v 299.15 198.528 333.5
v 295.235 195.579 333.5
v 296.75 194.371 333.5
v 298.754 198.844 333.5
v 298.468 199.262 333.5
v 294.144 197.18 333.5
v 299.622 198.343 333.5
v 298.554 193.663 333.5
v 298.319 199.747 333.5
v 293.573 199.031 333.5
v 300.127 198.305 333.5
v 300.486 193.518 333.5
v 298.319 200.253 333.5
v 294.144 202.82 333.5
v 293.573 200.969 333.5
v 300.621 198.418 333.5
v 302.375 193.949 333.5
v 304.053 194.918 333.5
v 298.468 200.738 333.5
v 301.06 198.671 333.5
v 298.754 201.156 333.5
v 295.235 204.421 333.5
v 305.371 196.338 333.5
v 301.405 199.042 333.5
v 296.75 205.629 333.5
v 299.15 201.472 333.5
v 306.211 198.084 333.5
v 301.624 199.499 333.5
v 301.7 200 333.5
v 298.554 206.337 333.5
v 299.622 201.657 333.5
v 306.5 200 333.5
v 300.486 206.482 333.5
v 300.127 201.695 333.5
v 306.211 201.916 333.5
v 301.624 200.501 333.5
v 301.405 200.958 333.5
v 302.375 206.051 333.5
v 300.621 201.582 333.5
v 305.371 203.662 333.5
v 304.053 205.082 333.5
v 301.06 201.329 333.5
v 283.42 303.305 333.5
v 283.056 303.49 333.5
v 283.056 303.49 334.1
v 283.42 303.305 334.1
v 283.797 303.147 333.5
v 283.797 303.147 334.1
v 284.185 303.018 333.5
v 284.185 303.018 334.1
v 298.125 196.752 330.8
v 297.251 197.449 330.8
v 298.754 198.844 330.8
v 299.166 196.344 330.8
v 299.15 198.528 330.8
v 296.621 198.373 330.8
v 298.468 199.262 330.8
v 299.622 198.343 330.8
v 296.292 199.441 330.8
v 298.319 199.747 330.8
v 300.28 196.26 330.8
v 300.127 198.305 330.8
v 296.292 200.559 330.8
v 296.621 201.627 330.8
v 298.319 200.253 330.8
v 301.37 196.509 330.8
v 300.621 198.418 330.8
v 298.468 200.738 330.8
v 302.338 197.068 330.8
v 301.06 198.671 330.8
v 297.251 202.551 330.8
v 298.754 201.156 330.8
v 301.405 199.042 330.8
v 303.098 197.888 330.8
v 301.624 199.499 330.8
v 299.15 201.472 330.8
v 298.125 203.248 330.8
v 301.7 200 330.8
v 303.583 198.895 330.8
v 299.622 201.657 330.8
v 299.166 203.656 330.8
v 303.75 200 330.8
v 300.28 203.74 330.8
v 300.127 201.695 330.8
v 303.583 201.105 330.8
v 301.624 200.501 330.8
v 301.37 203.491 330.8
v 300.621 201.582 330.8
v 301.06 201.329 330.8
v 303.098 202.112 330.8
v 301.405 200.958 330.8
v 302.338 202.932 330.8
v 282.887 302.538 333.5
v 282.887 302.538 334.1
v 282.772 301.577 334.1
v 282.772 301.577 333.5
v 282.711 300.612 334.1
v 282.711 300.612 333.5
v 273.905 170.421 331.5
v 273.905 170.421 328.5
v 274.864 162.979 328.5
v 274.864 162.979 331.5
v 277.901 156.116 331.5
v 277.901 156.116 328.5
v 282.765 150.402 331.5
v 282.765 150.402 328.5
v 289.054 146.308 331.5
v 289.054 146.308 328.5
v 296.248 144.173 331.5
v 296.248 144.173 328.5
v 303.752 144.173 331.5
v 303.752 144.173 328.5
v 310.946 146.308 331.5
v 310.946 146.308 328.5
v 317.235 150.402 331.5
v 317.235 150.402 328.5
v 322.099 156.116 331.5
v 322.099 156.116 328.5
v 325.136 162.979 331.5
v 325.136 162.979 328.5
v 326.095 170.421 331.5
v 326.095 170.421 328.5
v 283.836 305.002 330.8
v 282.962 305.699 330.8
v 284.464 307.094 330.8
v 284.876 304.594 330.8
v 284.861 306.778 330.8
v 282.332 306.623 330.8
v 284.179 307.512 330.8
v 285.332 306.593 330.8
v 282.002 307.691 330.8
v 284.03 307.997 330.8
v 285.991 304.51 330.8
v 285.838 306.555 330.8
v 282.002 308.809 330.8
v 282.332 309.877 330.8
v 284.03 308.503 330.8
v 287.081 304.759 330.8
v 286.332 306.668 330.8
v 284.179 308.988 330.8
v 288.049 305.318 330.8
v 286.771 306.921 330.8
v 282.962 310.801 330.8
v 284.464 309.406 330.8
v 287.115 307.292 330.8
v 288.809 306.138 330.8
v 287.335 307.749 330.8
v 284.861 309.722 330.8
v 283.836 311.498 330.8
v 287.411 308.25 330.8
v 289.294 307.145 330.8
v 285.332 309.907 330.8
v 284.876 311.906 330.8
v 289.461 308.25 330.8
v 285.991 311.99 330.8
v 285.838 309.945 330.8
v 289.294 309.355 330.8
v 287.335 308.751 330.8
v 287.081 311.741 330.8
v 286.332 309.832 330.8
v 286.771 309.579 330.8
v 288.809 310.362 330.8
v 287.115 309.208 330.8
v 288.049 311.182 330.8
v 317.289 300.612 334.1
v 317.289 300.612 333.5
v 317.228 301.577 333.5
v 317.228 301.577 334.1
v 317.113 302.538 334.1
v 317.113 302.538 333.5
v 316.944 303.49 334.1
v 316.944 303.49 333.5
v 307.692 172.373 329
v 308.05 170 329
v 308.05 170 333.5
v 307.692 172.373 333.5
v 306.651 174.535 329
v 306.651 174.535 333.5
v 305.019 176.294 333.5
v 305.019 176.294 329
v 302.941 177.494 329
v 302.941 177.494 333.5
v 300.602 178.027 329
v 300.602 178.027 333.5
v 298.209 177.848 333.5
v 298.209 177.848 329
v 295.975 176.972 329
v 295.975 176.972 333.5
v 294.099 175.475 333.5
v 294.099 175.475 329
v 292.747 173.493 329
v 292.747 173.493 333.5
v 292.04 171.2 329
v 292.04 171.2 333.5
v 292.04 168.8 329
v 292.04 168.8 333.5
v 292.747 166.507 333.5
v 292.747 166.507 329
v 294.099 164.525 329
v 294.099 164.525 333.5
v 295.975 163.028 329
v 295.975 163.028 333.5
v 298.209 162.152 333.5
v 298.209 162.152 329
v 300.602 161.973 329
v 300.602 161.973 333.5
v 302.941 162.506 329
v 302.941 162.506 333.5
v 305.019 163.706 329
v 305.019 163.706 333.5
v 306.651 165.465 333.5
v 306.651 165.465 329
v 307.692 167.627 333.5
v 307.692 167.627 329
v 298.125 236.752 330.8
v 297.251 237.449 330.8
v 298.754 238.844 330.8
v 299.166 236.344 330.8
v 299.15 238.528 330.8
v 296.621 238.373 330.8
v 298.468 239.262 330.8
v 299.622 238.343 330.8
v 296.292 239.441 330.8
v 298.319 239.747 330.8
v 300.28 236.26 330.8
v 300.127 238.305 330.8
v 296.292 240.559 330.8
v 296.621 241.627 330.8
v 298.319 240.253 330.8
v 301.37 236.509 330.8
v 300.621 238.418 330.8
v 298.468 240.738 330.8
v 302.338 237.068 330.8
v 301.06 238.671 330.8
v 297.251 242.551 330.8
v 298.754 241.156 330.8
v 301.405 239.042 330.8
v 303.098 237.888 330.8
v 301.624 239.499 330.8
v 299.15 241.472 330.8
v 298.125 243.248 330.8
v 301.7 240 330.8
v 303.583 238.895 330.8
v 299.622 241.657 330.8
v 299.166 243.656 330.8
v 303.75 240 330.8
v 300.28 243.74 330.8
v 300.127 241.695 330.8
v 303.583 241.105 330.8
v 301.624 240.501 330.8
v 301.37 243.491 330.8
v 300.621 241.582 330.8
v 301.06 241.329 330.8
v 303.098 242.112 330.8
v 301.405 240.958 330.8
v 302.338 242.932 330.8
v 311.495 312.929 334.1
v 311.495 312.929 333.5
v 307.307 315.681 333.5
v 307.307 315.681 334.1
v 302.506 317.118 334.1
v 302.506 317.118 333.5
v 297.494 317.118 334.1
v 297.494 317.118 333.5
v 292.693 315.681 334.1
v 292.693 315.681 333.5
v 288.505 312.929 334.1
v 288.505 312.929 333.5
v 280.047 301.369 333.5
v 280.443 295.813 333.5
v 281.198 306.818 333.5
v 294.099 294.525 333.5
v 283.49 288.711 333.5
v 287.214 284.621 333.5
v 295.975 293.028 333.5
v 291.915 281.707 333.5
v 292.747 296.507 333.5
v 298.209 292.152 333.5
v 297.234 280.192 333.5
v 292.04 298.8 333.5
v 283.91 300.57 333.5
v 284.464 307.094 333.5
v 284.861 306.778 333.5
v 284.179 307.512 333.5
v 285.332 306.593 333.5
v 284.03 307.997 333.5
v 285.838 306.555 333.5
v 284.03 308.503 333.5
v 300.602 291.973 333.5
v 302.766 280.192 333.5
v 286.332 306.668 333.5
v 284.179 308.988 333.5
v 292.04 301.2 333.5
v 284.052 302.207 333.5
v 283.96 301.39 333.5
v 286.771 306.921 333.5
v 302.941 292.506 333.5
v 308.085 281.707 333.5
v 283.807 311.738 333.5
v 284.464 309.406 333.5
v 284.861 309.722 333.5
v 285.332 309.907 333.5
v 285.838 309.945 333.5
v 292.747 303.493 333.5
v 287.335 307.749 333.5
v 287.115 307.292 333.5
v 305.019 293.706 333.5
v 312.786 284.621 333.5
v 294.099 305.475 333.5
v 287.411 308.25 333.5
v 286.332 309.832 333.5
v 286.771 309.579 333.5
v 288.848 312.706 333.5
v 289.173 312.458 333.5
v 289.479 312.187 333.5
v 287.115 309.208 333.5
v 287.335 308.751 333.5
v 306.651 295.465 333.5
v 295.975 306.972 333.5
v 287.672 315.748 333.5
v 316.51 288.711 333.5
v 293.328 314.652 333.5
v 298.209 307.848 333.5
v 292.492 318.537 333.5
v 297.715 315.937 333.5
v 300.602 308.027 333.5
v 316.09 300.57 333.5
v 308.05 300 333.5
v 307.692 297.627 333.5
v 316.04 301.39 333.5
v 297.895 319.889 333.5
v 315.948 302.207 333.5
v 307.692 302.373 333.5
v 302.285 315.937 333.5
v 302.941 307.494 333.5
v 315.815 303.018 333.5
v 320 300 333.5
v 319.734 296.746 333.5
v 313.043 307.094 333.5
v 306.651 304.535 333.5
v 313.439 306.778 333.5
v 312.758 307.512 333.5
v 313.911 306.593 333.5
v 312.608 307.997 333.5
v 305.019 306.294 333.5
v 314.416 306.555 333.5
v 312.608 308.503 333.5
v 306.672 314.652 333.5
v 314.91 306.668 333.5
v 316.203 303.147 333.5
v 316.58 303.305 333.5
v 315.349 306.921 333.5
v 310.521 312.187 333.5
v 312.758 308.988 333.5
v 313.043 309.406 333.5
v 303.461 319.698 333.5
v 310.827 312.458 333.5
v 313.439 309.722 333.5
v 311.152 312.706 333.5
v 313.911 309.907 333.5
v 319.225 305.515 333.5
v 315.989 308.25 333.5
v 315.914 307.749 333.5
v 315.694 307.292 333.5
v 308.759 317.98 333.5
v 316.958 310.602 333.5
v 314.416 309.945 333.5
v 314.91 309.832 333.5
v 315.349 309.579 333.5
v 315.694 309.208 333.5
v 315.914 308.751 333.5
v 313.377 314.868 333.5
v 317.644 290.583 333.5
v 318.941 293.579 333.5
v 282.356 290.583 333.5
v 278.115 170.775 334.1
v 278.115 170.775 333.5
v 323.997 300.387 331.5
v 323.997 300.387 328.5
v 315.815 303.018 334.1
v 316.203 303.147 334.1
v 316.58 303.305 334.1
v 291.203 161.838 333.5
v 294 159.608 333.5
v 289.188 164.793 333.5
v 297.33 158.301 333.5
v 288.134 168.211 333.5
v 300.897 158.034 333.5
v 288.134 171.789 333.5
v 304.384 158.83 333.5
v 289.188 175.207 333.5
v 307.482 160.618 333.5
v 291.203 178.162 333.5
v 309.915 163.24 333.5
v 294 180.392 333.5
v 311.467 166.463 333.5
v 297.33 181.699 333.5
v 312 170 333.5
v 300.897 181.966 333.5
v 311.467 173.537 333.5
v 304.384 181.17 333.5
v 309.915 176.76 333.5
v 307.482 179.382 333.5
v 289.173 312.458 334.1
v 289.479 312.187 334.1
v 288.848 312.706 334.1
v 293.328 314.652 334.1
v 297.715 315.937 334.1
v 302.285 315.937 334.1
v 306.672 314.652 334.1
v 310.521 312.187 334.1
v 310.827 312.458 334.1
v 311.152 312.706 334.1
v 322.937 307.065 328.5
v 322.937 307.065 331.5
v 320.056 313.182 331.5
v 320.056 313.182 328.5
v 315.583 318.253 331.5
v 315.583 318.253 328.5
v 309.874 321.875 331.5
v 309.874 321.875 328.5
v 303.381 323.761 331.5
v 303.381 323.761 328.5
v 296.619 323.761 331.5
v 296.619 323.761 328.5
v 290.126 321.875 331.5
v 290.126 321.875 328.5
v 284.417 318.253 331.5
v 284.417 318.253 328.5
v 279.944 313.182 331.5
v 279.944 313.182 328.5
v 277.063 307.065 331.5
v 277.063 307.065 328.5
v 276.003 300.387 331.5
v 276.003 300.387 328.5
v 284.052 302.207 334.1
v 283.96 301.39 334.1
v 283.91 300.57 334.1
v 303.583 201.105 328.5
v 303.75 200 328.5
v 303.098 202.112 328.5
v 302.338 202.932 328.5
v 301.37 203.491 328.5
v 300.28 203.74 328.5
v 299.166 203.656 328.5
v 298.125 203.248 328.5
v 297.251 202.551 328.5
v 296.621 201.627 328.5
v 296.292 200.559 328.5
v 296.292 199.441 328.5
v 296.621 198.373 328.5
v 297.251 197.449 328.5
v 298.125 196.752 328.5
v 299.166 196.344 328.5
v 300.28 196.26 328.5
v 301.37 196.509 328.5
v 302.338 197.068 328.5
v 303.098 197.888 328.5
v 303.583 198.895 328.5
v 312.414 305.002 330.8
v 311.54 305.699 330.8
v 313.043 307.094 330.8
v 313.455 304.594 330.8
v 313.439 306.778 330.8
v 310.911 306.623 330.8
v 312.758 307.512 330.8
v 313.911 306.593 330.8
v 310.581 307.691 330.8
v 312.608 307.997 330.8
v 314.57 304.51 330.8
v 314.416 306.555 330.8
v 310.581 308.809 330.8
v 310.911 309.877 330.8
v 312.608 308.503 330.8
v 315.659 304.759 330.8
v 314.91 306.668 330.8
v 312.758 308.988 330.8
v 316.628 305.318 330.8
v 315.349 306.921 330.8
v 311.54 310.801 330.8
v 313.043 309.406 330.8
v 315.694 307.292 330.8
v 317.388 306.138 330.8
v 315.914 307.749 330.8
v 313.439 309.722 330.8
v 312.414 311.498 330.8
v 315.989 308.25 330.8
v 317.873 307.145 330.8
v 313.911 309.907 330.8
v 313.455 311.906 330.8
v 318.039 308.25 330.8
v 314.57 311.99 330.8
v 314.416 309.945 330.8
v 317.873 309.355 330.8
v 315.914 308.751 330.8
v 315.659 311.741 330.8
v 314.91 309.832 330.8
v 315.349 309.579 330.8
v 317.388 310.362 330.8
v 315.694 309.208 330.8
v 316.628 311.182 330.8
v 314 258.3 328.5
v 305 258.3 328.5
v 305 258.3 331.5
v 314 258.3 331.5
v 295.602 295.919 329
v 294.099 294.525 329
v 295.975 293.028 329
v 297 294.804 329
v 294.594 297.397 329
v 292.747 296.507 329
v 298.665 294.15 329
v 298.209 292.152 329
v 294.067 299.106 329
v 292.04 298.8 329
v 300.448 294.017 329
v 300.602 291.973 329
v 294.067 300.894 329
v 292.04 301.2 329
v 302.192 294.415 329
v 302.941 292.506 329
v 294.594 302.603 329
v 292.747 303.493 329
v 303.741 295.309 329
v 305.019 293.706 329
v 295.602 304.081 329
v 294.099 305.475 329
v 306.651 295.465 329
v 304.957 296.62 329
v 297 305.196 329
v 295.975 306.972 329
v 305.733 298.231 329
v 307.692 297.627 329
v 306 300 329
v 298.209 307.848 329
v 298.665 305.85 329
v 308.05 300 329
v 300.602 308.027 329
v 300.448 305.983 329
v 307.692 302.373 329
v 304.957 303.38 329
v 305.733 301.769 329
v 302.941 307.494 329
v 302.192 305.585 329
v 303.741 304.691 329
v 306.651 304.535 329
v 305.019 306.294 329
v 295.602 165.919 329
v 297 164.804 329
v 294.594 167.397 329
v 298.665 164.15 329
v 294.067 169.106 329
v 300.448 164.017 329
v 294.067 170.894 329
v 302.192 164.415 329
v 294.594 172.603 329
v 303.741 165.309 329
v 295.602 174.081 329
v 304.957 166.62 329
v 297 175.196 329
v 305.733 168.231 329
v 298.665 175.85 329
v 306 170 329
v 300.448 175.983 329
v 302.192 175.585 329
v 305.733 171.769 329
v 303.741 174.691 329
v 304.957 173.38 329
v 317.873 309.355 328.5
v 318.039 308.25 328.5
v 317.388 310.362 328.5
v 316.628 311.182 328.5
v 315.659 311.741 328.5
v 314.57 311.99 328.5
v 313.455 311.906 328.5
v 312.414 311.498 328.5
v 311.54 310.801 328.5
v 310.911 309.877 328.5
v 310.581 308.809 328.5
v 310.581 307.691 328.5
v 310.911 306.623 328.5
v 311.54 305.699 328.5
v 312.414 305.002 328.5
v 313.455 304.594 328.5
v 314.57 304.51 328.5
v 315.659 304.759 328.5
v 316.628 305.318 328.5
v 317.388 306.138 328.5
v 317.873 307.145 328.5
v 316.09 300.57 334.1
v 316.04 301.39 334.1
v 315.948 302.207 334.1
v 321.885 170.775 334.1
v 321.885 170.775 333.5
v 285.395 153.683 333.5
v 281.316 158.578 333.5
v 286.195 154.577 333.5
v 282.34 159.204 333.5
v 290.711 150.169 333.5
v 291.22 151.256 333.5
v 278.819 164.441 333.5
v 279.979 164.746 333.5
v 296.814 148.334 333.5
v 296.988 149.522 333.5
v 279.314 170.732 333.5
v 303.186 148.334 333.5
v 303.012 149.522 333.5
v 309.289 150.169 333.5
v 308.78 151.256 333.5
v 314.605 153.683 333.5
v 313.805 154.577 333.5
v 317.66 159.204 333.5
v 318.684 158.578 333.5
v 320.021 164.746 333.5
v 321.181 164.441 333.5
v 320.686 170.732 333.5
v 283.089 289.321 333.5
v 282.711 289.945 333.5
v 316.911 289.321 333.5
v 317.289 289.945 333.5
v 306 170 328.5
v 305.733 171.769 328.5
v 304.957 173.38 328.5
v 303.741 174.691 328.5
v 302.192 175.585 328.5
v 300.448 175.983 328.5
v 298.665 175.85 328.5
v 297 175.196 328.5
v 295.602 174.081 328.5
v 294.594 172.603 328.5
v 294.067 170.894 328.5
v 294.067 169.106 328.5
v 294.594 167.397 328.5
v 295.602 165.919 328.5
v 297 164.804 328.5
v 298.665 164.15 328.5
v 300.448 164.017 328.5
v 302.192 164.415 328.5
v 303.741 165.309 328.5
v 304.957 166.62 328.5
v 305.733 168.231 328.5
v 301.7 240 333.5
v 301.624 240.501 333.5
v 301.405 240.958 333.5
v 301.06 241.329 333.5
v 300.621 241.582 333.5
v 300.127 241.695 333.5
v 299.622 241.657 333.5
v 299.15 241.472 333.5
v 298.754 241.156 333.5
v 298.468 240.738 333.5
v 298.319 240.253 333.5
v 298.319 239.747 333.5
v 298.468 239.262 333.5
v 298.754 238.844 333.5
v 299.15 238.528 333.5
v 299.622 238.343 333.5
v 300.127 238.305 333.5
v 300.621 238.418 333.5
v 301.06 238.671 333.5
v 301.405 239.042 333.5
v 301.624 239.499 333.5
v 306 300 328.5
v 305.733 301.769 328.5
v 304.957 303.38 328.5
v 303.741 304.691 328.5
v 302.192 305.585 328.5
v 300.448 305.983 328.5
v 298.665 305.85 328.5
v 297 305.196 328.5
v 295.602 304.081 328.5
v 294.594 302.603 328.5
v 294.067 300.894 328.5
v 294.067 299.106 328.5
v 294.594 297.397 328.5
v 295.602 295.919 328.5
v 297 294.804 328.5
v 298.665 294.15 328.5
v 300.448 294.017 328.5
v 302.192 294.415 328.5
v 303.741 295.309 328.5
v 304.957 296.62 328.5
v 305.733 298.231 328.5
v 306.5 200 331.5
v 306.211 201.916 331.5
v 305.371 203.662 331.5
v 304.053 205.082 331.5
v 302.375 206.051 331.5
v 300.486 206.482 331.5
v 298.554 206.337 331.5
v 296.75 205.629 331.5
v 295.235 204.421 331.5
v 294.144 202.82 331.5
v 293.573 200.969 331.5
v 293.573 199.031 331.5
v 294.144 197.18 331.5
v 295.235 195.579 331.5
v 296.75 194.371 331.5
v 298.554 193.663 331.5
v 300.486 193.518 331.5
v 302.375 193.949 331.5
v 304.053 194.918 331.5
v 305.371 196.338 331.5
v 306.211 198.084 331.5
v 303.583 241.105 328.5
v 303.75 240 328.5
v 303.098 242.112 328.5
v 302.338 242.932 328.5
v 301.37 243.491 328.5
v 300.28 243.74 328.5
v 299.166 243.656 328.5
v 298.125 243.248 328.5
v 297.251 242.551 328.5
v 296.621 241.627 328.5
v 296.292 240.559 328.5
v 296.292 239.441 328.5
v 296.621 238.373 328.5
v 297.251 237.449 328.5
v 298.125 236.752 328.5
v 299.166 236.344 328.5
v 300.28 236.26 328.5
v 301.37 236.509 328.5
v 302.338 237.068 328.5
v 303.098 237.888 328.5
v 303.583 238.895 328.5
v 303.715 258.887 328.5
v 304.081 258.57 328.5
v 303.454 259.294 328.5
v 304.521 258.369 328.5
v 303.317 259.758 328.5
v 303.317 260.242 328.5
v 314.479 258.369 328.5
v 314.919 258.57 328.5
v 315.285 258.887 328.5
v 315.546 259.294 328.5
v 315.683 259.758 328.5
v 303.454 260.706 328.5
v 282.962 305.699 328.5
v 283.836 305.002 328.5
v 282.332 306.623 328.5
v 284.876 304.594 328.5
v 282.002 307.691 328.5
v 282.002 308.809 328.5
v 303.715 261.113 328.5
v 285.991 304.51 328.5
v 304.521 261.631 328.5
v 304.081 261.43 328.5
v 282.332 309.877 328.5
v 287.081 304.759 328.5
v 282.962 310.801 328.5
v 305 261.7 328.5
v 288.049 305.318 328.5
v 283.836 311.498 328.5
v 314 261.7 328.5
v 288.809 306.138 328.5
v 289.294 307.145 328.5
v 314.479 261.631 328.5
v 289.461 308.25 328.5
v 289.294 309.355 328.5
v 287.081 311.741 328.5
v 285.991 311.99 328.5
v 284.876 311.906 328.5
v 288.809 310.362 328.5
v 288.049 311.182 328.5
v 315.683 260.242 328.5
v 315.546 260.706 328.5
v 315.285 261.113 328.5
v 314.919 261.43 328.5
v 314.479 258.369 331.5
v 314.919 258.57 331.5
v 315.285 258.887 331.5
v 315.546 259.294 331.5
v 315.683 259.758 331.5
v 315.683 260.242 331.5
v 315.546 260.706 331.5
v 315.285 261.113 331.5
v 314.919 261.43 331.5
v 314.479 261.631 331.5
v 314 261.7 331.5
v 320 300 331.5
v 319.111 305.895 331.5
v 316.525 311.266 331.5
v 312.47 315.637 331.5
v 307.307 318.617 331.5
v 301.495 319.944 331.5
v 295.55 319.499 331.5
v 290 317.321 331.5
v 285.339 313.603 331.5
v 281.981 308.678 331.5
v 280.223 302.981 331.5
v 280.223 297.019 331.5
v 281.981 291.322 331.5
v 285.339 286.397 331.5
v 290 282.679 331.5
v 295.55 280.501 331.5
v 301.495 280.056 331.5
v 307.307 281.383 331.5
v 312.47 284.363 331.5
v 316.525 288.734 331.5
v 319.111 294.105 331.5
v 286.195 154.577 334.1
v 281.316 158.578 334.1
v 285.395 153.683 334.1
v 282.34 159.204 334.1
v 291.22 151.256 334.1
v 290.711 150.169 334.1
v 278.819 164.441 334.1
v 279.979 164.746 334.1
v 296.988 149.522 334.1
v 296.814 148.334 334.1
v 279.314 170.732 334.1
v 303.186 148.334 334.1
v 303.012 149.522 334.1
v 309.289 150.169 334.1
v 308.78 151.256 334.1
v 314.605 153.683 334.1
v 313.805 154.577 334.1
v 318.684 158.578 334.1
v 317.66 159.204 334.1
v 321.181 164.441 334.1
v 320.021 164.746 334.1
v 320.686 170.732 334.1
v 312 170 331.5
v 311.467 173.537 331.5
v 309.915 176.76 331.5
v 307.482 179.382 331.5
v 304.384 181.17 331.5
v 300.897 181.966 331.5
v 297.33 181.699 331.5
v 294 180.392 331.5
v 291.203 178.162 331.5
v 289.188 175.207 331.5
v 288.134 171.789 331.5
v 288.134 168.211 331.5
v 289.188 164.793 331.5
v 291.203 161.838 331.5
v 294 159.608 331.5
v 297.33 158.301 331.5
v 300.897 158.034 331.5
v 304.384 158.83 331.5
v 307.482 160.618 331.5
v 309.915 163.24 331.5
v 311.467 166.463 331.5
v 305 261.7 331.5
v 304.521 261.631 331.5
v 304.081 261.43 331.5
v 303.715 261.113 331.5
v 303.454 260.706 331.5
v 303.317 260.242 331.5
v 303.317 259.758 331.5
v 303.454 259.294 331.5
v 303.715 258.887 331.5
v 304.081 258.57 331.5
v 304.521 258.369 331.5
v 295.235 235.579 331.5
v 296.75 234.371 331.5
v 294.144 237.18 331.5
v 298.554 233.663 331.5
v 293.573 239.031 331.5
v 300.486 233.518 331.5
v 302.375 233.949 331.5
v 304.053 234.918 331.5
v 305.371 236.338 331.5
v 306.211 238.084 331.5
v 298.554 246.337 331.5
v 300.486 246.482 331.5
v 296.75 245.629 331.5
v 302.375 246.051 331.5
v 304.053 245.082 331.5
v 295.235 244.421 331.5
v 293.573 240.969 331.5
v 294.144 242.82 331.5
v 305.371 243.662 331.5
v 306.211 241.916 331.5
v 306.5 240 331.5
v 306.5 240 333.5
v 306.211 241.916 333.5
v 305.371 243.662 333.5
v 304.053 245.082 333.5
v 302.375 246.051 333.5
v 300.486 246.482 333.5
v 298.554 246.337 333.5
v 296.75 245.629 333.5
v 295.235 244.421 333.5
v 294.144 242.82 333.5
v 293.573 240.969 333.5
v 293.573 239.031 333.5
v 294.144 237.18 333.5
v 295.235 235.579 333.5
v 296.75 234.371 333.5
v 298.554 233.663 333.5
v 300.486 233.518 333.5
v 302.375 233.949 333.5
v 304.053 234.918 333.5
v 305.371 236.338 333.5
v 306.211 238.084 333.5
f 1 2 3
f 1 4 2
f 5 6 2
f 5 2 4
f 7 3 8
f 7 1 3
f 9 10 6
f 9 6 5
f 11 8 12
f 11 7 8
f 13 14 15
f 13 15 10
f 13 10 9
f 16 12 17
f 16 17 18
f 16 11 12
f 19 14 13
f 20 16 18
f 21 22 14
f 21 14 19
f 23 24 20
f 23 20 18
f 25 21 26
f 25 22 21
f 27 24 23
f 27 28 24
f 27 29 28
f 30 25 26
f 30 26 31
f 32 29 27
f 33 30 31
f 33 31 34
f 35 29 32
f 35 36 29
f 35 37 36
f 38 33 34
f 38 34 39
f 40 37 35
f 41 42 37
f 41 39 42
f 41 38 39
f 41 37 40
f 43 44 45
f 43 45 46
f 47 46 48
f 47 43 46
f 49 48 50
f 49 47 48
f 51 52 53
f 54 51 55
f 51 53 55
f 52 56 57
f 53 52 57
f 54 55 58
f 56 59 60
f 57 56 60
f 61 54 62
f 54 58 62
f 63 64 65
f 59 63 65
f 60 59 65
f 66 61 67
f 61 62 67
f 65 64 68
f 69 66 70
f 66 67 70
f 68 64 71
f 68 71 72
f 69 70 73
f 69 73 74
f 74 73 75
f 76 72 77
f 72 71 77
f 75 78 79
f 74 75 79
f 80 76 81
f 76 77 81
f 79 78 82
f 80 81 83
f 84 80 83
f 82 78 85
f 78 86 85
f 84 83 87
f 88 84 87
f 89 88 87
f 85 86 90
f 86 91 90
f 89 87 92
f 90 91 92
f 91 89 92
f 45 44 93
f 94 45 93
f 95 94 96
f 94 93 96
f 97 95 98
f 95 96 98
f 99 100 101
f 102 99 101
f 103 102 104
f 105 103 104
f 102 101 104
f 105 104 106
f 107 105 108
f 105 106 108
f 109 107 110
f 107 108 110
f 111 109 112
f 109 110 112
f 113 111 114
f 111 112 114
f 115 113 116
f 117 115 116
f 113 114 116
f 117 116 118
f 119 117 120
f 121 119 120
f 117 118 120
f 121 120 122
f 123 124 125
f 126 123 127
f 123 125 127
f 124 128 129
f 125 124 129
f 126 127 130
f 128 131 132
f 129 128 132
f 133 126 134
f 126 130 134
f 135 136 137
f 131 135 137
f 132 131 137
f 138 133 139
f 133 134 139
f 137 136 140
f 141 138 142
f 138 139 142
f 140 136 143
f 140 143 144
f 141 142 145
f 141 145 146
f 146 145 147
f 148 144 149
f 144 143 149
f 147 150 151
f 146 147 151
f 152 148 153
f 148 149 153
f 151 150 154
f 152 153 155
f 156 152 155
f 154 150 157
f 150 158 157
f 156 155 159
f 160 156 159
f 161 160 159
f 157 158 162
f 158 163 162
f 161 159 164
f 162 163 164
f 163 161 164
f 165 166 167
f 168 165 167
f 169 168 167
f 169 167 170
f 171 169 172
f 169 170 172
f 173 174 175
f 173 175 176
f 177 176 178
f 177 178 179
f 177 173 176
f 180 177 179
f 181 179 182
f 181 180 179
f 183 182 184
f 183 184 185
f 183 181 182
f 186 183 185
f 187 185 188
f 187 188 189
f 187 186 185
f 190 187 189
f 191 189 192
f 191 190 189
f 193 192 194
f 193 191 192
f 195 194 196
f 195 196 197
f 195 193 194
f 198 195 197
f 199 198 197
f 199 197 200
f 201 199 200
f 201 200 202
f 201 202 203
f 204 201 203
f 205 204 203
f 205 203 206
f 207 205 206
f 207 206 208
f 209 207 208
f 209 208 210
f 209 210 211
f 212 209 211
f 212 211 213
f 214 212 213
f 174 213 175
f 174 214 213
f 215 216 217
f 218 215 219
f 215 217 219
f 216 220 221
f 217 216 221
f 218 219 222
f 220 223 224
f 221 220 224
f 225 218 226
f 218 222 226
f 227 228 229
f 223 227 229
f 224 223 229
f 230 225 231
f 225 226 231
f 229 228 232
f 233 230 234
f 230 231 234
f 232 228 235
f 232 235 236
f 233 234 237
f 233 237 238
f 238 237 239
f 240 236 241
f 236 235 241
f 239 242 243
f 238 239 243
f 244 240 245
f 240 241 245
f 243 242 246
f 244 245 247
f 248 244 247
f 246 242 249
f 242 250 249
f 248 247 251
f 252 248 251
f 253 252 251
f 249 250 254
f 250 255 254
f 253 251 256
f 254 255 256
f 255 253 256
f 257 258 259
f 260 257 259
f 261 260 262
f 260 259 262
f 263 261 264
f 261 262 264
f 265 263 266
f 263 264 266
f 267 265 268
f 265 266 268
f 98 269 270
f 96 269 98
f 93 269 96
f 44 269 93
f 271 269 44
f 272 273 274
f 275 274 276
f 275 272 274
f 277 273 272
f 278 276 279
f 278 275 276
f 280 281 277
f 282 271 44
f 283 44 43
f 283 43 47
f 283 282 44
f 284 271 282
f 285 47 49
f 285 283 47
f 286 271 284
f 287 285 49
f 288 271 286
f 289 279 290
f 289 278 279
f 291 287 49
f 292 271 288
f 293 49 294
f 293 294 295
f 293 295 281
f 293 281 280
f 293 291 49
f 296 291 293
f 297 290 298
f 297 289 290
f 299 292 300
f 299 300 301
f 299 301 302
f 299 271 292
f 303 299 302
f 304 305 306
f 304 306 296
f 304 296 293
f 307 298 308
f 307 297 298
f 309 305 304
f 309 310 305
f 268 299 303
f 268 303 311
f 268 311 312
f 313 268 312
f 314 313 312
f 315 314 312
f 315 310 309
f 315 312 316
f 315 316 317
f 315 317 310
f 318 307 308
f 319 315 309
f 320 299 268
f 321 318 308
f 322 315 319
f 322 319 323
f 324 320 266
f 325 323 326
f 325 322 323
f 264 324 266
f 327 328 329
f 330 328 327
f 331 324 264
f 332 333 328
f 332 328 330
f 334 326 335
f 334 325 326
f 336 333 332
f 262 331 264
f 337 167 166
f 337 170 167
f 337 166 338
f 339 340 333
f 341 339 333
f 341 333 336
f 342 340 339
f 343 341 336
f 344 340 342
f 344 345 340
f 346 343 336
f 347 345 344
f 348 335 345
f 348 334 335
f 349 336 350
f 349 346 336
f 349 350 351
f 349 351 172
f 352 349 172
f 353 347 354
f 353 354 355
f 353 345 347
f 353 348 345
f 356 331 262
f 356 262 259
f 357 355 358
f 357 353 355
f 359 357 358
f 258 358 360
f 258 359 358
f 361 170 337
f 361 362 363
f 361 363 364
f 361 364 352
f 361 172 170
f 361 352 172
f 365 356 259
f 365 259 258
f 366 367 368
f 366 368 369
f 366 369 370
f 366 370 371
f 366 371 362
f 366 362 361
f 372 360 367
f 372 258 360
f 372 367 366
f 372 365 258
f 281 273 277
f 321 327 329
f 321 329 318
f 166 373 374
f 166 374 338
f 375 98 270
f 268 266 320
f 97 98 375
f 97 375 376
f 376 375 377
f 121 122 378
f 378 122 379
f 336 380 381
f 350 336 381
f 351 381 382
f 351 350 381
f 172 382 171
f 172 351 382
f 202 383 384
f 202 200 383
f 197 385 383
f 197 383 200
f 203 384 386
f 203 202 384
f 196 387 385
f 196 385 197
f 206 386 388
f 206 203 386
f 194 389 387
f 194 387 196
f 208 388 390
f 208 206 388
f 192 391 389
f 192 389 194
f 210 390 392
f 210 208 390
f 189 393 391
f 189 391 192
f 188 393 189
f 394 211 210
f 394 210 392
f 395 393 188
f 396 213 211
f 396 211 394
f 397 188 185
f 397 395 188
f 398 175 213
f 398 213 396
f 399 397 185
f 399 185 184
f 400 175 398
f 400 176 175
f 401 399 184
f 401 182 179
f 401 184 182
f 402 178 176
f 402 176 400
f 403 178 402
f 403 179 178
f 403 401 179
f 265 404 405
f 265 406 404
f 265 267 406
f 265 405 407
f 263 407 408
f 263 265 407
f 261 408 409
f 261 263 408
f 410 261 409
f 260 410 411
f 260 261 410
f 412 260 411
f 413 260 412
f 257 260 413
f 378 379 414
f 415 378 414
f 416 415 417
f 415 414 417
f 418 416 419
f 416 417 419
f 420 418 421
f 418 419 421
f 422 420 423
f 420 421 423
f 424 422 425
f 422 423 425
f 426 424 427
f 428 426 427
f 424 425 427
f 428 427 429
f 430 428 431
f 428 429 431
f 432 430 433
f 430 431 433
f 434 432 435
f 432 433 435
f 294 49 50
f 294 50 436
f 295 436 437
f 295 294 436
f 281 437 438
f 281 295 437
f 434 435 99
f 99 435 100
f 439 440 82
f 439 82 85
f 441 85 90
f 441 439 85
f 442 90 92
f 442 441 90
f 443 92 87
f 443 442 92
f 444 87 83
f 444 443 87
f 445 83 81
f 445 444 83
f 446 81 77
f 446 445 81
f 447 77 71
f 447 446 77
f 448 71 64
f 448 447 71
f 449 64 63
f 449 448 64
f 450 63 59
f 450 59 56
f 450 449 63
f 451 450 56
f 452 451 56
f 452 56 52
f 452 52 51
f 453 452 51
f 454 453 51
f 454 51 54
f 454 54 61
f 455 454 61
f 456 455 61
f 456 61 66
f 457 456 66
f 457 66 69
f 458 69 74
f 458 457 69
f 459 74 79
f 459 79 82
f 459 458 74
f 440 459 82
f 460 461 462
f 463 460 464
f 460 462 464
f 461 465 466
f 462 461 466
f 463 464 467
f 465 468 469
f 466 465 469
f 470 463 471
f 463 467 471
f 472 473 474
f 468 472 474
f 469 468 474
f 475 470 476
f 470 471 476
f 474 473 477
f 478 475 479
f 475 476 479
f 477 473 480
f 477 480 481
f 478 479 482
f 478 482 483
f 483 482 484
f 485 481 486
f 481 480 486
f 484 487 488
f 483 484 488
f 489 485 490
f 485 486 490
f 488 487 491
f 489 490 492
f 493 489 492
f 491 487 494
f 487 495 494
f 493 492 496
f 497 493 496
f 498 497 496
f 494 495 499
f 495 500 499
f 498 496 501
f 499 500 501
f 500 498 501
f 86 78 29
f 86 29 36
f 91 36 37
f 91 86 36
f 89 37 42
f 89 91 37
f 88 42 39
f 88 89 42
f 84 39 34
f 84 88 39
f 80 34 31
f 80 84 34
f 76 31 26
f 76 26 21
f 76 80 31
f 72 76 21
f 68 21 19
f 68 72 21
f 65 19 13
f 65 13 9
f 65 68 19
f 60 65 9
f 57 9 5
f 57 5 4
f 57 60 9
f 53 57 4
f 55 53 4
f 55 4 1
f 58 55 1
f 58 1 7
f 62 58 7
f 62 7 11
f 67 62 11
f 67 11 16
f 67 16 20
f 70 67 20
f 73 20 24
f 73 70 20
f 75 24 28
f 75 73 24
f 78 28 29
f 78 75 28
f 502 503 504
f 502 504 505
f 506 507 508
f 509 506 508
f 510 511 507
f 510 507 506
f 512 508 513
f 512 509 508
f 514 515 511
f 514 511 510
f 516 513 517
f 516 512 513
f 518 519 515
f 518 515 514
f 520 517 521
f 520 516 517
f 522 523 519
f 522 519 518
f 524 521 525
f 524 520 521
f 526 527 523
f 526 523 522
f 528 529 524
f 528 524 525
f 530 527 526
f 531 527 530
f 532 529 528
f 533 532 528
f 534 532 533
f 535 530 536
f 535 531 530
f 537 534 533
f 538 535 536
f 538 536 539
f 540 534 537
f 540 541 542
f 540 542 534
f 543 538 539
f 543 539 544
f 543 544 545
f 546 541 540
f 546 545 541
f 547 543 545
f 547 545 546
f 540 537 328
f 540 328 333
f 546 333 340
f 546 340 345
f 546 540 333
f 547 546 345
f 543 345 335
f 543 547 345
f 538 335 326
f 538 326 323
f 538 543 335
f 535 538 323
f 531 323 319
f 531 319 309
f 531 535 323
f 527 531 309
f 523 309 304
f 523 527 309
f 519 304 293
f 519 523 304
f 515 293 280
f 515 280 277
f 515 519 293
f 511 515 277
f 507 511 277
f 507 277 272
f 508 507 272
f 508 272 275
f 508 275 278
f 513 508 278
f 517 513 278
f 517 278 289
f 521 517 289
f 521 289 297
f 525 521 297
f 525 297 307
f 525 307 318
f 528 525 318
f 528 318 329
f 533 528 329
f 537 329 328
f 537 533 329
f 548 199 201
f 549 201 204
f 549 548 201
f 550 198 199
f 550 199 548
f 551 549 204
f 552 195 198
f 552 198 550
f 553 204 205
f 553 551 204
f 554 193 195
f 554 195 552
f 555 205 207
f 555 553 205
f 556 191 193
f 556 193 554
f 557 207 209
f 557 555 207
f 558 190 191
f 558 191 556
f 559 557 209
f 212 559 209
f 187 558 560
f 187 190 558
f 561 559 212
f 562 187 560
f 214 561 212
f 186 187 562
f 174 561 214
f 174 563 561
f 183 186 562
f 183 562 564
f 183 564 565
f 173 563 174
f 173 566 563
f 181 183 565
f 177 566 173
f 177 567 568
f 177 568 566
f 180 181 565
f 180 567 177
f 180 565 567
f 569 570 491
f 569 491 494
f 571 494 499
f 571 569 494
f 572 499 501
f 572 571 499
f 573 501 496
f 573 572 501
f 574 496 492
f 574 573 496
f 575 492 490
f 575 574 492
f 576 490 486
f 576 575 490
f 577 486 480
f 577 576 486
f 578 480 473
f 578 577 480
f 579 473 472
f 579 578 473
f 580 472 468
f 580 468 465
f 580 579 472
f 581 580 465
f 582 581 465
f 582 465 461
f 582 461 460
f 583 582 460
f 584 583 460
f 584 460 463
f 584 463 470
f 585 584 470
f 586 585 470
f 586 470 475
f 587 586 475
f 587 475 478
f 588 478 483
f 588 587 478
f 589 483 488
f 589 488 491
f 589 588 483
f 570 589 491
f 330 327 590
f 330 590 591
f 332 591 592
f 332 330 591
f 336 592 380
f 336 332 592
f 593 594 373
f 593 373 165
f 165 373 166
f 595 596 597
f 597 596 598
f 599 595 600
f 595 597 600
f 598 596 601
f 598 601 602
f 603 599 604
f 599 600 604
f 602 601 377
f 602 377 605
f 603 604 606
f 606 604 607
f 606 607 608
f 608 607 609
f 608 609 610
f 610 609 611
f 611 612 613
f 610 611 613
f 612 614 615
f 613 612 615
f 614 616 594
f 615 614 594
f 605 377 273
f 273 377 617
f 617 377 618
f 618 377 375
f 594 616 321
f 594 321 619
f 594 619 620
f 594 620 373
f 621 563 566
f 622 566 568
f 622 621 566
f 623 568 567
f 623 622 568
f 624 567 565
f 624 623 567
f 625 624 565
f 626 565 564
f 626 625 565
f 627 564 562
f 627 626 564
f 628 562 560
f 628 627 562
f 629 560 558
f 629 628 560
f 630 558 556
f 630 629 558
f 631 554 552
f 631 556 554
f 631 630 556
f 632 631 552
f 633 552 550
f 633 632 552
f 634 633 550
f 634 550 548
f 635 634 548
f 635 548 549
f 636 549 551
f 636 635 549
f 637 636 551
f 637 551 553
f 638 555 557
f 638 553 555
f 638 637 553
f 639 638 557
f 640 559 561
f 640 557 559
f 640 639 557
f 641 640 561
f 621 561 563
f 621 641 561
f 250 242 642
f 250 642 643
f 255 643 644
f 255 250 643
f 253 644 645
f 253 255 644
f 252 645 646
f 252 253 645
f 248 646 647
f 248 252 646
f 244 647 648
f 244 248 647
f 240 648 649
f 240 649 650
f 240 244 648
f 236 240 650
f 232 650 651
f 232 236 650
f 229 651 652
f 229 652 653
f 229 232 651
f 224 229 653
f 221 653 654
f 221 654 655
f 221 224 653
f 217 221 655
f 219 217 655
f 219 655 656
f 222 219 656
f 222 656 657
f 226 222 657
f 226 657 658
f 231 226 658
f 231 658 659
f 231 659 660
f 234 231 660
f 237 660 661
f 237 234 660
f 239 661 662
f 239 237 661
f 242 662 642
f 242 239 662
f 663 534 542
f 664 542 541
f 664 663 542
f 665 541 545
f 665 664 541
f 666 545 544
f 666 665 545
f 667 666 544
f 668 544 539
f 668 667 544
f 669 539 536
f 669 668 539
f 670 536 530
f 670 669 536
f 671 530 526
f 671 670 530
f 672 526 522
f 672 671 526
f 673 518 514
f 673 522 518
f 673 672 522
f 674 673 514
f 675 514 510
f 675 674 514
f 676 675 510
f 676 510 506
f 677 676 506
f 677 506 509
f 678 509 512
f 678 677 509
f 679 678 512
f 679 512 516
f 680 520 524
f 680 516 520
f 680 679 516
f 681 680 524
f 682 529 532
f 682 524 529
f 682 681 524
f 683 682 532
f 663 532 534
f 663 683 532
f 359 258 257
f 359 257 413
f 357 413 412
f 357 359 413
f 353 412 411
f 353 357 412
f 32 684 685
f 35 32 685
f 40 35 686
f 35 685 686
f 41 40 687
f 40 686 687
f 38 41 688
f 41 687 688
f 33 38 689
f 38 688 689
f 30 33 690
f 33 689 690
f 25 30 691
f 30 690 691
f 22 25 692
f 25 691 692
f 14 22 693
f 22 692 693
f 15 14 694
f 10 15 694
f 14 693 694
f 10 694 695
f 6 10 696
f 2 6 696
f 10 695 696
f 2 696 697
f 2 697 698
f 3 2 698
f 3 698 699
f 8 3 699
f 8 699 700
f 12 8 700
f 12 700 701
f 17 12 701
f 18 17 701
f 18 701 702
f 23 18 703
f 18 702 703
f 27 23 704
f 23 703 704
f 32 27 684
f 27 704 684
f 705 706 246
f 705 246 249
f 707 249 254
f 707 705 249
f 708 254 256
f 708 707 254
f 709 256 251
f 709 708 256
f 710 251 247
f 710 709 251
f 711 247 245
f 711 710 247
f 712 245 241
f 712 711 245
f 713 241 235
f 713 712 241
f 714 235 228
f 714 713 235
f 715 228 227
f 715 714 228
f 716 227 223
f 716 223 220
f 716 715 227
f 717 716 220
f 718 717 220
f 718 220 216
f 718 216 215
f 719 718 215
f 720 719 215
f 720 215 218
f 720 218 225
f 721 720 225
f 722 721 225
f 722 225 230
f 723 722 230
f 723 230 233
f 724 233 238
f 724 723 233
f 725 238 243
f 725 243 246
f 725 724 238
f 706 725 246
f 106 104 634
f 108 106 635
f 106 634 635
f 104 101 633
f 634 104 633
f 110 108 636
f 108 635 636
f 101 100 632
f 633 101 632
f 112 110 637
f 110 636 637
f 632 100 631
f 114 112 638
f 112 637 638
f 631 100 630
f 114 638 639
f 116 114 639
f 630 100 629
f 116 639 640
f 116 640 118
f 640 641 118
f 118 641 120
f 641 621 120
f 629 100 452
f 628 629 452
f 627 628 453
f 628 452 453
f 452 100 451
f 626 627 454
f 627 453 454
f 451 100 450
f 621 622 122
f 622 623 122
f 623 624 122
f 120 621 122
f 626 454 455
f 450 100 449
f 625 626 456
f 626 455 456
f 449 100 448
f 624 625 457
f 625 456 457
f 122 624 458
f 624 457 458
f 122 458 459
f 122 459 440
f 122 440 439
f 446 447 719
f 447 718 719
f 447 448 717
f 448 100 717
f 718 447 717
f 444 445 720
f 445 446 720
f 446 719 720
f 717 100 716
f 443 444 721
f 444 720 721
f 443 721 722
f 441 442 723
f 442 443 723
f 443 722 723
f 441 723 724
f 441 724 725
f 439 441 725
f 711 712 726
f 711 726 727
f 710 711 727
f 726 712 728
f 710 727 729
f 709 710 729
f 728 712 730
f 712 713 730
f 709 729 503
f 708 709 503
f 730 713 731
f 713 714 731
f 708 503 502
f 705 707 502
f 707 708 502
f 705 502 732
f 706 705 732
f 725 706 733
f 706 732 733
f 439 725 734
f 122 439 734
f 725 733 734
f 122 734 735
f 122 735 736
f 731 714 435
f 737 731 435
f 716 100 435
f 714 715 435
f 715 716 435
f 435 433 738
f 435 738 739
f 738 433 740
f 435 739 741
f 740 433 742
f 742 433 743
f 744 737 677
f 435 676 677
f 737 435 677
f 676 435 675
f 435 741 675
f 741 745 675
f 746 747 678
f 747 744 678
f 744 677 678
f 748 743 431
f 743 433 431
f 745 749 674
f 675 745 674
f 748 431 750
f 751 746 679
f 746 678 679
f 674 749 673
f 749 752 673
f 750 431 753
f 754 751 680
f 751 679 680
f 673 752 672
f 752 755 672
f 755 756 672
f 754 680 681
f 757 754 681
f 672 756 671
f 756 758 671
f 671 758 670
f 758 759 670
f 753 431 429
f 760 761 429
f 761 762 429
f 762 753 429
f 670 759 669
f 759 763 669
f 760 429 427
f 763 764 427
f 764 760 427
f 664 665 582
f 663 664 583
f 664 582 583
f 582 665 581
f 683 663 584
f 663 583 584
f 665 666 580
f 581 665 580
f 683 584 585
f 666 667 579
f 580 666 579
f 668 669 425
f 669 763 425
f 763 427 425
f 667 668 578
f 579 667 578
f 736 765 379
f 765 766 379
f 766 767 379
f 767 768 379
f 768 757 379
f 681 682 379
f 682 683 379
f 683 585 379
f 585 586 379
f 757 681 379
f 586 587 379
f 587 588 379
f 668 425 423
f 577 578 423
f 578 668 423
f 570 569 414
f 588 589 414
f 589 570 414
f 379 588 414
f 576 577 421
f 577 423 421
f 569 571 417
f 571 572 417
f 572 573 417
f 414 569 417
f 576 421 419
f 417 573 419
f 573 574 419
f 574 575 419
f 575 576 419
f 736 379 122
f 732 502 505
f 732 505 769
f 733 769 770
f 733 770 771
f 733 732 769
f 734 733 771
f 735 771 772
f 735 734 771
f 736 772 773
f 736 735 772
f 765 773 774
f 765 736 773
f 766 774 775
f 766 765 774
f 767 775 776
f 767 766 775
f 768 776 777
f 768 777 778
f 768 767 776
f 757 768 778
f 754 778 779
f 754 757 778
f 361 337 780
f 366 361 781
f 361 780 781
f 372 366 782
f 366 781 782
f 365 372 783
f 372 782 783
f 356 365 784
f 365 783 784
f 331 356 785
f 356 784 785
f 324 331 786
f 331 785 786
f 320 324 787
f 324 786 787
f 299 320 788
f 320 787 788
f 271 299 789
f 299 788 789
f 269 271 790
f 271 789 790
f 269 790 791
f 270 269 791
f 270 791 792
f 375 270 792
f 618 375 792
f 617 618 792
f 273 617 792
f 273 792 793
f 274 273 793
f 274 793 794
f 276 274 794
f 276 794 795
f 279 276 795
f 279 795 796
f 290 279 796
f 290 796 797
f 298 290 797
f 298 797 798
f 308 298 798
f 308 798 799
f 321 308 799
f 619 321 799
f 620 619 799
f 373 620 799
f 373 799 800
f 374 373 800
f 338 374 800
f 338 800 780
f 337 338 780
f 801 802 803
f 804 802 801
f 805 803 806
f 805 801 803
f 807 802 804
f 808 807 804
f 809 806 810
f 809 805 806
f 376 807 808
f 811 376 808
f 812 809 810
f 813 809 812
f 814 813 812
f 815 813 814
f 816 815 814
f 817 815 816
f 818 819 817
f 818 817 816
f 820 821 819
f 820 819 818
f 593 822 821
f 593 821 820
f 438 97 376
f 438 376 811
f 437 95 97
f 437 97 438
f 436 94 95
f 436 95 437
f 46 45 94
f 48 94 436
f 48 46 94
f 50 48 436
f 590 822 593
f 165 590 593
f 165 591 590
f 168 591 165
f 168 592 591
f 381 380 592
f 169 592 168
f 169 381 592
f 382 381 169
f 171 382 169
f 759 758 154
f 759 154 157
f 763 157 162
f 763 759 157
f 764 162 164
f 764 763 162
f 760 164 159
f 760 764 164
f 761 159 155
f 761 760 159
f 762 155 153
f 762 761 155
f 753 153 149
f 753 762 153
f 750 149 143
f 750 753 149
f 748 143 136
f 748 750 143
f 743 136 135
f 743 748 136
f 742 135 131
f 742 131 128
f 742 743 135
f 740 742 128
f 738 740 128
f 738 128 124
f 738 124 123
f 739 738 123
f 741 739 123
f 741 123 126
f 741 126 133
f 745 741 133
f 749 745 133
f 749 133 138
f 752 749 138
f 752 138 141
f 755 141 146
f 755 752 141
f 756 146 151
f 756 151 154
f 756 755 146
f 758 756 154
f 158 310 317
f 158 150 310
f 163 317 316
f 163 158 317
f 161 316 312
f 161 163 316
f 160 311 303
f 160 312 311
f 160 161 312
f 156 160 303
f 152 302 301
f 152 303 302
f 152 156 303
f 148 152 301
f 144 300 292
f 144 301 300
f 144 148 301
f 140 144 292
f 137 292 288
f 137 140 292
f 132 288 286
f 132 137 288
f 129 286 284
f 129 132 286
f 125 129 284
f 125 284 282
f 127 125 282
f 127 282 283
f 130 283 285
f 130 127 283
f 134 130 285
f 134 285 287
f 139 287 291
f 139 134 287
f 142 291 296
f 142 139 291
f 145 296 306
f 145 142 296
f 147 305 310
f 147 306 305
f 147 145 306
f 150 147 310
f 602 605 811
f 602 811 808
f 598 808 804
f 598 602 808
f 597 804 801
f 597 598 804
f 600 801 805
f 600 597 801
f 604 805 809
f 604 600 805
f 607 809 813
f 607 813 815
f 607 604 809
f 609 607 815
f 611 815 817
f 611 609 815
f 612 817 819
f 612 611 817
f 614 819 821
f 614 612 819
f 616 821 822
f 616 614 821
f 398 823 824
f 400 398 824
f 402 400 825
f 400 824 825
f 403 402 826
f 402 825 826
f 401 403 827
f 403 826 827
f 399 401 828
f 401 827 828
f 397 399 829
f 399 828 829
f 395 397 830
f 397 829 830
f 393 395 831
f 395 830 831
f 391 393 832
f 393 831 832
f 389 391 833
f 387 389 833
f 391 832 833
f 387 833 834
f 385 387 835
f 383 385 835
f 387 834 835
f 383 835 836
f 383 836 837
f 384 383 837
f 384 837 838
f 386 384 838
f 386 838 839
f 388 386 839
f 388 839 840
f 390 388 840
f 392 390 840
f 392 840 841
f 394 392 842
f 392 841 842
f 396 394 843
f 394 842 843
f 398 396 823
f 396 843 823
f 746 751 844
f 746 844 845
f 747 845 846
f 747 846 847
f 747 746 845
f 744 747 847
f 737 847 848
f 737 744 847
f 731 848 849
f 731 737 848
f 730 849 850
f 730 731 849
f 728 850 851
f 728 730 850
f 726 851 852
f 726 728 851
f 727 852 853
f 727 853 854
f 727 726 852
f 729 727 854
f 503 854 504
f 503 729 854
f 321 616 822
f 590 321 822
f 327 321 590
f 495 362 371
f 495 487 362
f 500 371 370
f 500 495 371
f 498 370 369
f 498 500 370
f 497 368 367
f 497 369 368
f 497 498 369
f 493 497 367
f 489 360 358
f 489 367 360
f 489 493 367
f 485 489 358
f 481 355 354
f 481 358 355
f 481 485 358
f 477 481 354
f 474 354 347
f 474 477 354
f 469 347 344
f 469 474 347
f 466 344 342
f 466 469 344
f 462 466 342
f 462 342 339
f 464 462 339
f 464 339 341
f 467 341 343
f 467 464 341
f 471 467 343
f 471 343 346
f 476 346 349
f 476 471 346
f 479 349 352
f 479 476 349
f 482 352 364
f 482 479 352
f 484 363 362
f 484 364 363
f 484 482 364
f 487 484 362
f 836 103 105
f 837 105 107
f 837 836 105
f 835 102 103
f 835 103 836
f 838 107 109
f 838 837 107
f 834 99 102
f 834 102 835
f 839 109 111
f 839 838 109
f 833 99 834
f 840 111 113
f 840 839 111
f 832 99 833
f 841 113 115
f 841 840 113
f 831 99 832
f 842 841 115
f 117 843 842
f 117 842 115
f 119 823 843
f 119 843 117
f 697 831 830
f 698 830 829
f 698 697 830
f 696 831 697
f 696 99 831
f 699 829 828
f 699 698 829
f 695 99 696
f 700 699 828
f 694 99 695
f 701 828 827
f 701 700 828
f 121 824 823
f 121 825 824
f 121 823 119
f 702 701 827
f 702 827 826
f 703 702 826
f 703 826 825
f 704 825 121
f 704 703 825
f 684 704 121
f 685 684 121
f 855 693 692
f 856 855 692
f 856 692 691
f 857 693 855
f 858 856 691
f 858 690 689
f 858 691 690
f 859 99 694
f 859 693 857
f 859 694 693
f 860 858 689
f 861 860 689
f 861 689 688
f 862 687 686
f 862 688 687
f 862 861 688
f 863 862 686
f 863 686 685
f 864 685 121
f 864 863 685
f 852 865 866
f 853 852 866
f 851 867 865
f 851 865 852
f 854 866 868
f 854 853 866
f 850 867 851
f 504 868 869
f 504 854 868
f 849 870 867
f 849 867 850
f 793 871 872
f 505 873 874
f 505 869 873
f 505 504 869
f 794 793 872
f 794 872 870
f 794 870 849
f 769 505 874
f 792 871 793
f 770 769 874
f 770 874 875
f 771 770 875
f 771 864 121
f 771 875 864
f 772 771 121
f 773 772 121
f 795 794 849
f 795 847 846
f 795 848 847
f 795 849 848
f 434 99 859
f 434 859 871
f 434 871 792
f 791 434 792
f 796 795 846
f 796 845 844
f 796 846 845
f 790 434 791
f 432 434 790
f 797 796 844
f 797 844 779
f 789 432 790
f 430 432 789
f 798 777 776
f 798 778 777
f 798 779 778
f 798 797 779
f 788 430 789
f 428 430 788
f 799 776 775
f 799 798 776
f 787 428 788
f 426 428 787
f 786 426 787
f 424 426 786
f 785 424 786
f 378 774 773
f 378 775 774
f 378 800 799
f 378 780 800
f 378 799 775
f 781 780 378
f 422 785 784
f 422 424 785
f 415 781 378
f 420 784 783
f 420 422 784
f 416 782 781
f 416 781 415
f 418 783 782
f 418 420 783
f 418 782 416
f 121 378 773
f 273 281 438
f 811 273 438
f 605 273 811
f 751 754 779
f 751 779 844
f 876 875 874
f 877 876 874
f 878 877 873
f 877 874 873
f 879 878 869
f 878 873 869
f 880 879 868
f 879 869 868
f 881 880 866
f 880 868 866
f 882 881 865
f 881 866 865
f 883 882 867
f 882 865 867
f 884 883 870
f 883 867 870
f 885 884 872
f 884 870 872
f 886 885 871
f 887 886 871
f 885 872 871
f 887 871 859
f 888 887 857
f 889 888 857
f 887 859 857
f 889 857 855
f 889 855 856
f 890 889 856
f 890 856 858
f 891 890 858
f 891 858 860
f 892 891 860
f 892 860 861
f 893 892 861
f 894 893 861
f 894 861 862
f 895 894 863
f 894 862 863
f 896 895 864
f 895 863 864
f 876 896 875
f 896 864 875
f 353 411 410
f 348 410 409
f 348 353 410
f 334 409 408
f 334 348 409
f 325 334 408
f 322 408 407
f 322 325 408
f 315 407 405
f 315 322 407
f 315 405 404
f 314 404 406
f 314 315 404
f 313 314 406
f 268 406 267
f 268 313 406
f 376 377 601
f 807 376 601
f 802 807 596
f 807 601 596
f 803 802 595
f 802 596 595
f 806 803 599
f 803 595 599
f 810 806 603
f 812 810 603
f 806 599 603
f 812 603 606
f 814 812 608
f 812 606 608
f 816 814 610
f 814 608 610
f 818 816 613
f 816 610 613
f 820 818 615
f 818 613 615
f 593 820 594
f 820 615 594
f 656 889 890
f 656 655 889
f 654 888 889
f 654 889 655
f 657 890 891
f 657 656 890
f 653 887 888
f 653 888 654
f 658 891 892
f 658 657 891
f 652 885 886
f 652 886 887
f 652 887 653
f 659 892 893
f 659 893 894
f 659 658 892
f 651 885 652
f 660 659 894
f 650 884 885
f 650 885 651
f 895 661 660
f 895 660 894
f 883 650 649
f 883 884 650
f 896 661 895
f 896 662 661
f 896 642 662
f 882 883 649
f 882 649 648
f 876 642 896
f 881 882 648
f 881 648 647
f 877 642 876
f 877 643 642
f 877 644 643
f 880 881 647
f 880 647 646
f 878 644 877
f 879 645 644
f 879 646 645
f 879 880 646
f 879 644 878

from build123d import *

# Parameters (mm, degrees)
SKETCH1_R           = 6
SKETCH1_R_2         = 1.7
BOSS_EXTRUDE1_DEPTH = 3
SKETCH2_R           = 20
SKETCH2_R_2         = 6
SKETCH2_R_3         = 1.7
BOSS_EXTRUDE2_DEPTH = 2
SKETCH3_R           = 12
SKETCH3_R_2         = 6
BOSS_EXTRUDE3_DEPTH = 2
SKETCH4_R           = 6.5
SKETCH4_R_2         = 1.7
BOSS_EXTRUDE4_DEPTH = 2
SKETCH5_R           = 6.5
SKETCH5_R_2         = 1.7
BOSS_EXTRUDE5_DEPTH = 2
BOSS_EXTRUDE6_DEPTH = 0.6
SKETCH7_R           = 5.45
CUT_EXTRUDE1_DEPTH  = 0.6
SKETCH8_R           = 8.05
CUT_EXTRUDE2_DEPTH  = 4.5
SKETCH9_R           = 3.75
CUT_EXTRUDE3_DEPTH  = 2.3


with BuildPart() as part:
    # Sketch1 → Boss-Extrude1 (new body)
    with BuildSketch(Plane.XY.offset(328.5)):
        with BuildLine():
            Line((276.003127371, 300.387432585), (273.904807661, 170.421310226))
            ThreePointArc((273.904807661, 170.421310226), (300, 143.901406829), (326.095192339, 170.421310226))
            Line((326.095192339, 170.421310226), (323.996872629, 300.387432585))
            ThreePointArc((323.996872629, 300.387432585), (300, 324), (276.003127371, 300.387432585))
        make_face()
        with Locations((300, 300)):
            Circle(SKETCH1_R, mode=Mode.SUBTRACT)
        with Locations((300, 170)):
            Circle(SKETCH1_R, mode=Mode.SUBTRACT)
        with Locations((314.289419162, 308.25)):
            Circle(SKETCH1_R_2, mode=Mode.SUBTRACT)
        with Locations((285.710580838, 308.25)):
            Circle(SKETCH1_R_2, mode=Mode.SUBTRACT)
        with Locations((300, 240)):
            Circle(SKETCH1_R_2, mode=Mode.SUBTRACT)
        with Locations((300, 200)):
            Circle(SKETCH1_R_2, mode=Mode.SUBTRACT)
        with BuildLine():
            Line((305, 258.3), (314, 258.3))
            ThreePointArc((314, 258.3), (315.7, 260), (314, 261.7))
            Line((314, 261.7), (305, 261.7))
            ThreePointArc((305, 261.7), (303.3, 260), (305, 258.3))
        make_face(mode=Mode.SUBTRACT)
    extrude(amount=BOSS_EXTRUDE1_DEPTH)

    # Sketch2 → Boss-Extrude2 (add)
    with BuildSketch(Plane.XY.offset(331.5)):
        with Locations((300, 300)):
            Circle(SKETCH2_R)
        with Locations((300, 300)):
            Circle(SKETCH2_R_2, mode=Mode.SUBTRACT)
        with Locations((314.289419162, 308.25)):
            Circle(SKETCH2_R_3, mode=Mode.SUBTRACT)
        with Locations((285.710580838, 308.25)):
            Circle(SKETCH2_R_3, mode=Mode.SUBTRACT)
    extrude(amount=BOSS_EXTRUDE2_DEPTH)

    # Sketch3 → Boss-Extrude3 (add)
    with BuildSketch(Plane.XY.offset(331.5)):
        with Locations((300, 170)):
            Circle(SKETCH3_R)
        with Locations((300, 170)):
            Circle(SKETCH3_R_2, mode=Mode.SUBTRACT)
    extrude(amount=BOSS_EXTRUDE3_DEPTH)

    # Sketch4 → Boss-Extrude4 (add)
    with BuildSketch(Plane.XY.offset(331.5)):
        with Locations((300, 240)):
            Circle(SKETCH4_R)
        with Locations((300, 240)):
            Circle(SKETCH4_R_2, mode=Mode.SUBTRACT)
    extrude(amount=BOSS_EXTRUDE4_DEPTH)

    # Sketch5 → Boss-Extrude5 (add)
    with BuildSketch(Plane.XY.offset(331.5)):
        with Locations((300, 200)):
            Circle(SKETCH5_R)
        with Locations((300, 200)):
            Circle(SKETCH5_R_2, mode=Mode.SUBTRACT)
    extrude(amount=BOSS_EXTRUDE5_DEPTH)

    # Sketch6 → Boss-Extrude6 (add)
    with BuildSketch(Plane.XY.offset(333.5)):
        with BuildLine():
            Line((282.710827179, 300.61196663), (278.11511203, 170.774636315))
            ThreePointArc((278.11511203, 170.774636315), (300, 148.101406829), (321.88488797, 170.774636315))
            Line((321.88488797, 170.774636315), (317.289172821, 300.61196663))
            ThreePointArc((317.289172821, 300.61196663), (300, 317.3), (282.710827179, 300.61196663))
        make_face()
        with BuildLine():
            Line((283.910076161, 300.569518077), (279.314361012, 170.732187763))
            ThreePointArc((279.314361012, 170.732187763), (300, 149.301406829), (320.685638988, 170.732187763))
            Line((320.685638988, 170.732187763), (316.089923839, 300.569518077))
            ThreePointArc((316.089923839, 300.569518077), (300, 316.1), (283.910076161, 300.569518077))
        make_face(mode=Mode.SUBTRACT)
    extrude(amount=BOSS_EXTRUDE6_DEPTH)

    # Sketch7 → Cut-Extrude1 (cut)
    with BuildSketch(Plane.XY.offset(333.5)):
        with Locations((314.289419162, 308.25)):
            Circle(SKETCH7_R)
        with Locations((285.710580838, 308.25)):
            Circle(SKETCH7_R)
    extrude(amount=CUT_EXTRUDE1_DEPTH, mode=Mode.SUBTRACT)

    # Sketch8 → Cut-Extrude2 (cut)
    with BuildSketch(Plane.XY.offset(329)):
        with Locations((300, 300)):
            Circle(SKETCH8_R)
        with Locations((300, 170)):
            Circle(SKETCH8_R)
    extrude(amount=CUT_EXTRUDE2_DEPTH, mode=Mode.SUBTRACT)

    # Sketch9 → Cut-Extrude3 (cut)
    with BuildSketch(Plane.XY.offset(328.5)):
        with Locations((314.289419162, 308.25)):
            Circle(SKETCH9_R)
        with Locations((285.710580838, 308.25)):
            Circle(SKETCH9_R)
        with Locations((300, 240)):
            Circle(SKETCH9_R)
        with Locations((300, 200)):
            Circle(SKETCH9_R)
    extrude(amount=CUT_EXTRUDE3_DEPTH, mode=Mode.SUBTRACT)


solid = part.part
